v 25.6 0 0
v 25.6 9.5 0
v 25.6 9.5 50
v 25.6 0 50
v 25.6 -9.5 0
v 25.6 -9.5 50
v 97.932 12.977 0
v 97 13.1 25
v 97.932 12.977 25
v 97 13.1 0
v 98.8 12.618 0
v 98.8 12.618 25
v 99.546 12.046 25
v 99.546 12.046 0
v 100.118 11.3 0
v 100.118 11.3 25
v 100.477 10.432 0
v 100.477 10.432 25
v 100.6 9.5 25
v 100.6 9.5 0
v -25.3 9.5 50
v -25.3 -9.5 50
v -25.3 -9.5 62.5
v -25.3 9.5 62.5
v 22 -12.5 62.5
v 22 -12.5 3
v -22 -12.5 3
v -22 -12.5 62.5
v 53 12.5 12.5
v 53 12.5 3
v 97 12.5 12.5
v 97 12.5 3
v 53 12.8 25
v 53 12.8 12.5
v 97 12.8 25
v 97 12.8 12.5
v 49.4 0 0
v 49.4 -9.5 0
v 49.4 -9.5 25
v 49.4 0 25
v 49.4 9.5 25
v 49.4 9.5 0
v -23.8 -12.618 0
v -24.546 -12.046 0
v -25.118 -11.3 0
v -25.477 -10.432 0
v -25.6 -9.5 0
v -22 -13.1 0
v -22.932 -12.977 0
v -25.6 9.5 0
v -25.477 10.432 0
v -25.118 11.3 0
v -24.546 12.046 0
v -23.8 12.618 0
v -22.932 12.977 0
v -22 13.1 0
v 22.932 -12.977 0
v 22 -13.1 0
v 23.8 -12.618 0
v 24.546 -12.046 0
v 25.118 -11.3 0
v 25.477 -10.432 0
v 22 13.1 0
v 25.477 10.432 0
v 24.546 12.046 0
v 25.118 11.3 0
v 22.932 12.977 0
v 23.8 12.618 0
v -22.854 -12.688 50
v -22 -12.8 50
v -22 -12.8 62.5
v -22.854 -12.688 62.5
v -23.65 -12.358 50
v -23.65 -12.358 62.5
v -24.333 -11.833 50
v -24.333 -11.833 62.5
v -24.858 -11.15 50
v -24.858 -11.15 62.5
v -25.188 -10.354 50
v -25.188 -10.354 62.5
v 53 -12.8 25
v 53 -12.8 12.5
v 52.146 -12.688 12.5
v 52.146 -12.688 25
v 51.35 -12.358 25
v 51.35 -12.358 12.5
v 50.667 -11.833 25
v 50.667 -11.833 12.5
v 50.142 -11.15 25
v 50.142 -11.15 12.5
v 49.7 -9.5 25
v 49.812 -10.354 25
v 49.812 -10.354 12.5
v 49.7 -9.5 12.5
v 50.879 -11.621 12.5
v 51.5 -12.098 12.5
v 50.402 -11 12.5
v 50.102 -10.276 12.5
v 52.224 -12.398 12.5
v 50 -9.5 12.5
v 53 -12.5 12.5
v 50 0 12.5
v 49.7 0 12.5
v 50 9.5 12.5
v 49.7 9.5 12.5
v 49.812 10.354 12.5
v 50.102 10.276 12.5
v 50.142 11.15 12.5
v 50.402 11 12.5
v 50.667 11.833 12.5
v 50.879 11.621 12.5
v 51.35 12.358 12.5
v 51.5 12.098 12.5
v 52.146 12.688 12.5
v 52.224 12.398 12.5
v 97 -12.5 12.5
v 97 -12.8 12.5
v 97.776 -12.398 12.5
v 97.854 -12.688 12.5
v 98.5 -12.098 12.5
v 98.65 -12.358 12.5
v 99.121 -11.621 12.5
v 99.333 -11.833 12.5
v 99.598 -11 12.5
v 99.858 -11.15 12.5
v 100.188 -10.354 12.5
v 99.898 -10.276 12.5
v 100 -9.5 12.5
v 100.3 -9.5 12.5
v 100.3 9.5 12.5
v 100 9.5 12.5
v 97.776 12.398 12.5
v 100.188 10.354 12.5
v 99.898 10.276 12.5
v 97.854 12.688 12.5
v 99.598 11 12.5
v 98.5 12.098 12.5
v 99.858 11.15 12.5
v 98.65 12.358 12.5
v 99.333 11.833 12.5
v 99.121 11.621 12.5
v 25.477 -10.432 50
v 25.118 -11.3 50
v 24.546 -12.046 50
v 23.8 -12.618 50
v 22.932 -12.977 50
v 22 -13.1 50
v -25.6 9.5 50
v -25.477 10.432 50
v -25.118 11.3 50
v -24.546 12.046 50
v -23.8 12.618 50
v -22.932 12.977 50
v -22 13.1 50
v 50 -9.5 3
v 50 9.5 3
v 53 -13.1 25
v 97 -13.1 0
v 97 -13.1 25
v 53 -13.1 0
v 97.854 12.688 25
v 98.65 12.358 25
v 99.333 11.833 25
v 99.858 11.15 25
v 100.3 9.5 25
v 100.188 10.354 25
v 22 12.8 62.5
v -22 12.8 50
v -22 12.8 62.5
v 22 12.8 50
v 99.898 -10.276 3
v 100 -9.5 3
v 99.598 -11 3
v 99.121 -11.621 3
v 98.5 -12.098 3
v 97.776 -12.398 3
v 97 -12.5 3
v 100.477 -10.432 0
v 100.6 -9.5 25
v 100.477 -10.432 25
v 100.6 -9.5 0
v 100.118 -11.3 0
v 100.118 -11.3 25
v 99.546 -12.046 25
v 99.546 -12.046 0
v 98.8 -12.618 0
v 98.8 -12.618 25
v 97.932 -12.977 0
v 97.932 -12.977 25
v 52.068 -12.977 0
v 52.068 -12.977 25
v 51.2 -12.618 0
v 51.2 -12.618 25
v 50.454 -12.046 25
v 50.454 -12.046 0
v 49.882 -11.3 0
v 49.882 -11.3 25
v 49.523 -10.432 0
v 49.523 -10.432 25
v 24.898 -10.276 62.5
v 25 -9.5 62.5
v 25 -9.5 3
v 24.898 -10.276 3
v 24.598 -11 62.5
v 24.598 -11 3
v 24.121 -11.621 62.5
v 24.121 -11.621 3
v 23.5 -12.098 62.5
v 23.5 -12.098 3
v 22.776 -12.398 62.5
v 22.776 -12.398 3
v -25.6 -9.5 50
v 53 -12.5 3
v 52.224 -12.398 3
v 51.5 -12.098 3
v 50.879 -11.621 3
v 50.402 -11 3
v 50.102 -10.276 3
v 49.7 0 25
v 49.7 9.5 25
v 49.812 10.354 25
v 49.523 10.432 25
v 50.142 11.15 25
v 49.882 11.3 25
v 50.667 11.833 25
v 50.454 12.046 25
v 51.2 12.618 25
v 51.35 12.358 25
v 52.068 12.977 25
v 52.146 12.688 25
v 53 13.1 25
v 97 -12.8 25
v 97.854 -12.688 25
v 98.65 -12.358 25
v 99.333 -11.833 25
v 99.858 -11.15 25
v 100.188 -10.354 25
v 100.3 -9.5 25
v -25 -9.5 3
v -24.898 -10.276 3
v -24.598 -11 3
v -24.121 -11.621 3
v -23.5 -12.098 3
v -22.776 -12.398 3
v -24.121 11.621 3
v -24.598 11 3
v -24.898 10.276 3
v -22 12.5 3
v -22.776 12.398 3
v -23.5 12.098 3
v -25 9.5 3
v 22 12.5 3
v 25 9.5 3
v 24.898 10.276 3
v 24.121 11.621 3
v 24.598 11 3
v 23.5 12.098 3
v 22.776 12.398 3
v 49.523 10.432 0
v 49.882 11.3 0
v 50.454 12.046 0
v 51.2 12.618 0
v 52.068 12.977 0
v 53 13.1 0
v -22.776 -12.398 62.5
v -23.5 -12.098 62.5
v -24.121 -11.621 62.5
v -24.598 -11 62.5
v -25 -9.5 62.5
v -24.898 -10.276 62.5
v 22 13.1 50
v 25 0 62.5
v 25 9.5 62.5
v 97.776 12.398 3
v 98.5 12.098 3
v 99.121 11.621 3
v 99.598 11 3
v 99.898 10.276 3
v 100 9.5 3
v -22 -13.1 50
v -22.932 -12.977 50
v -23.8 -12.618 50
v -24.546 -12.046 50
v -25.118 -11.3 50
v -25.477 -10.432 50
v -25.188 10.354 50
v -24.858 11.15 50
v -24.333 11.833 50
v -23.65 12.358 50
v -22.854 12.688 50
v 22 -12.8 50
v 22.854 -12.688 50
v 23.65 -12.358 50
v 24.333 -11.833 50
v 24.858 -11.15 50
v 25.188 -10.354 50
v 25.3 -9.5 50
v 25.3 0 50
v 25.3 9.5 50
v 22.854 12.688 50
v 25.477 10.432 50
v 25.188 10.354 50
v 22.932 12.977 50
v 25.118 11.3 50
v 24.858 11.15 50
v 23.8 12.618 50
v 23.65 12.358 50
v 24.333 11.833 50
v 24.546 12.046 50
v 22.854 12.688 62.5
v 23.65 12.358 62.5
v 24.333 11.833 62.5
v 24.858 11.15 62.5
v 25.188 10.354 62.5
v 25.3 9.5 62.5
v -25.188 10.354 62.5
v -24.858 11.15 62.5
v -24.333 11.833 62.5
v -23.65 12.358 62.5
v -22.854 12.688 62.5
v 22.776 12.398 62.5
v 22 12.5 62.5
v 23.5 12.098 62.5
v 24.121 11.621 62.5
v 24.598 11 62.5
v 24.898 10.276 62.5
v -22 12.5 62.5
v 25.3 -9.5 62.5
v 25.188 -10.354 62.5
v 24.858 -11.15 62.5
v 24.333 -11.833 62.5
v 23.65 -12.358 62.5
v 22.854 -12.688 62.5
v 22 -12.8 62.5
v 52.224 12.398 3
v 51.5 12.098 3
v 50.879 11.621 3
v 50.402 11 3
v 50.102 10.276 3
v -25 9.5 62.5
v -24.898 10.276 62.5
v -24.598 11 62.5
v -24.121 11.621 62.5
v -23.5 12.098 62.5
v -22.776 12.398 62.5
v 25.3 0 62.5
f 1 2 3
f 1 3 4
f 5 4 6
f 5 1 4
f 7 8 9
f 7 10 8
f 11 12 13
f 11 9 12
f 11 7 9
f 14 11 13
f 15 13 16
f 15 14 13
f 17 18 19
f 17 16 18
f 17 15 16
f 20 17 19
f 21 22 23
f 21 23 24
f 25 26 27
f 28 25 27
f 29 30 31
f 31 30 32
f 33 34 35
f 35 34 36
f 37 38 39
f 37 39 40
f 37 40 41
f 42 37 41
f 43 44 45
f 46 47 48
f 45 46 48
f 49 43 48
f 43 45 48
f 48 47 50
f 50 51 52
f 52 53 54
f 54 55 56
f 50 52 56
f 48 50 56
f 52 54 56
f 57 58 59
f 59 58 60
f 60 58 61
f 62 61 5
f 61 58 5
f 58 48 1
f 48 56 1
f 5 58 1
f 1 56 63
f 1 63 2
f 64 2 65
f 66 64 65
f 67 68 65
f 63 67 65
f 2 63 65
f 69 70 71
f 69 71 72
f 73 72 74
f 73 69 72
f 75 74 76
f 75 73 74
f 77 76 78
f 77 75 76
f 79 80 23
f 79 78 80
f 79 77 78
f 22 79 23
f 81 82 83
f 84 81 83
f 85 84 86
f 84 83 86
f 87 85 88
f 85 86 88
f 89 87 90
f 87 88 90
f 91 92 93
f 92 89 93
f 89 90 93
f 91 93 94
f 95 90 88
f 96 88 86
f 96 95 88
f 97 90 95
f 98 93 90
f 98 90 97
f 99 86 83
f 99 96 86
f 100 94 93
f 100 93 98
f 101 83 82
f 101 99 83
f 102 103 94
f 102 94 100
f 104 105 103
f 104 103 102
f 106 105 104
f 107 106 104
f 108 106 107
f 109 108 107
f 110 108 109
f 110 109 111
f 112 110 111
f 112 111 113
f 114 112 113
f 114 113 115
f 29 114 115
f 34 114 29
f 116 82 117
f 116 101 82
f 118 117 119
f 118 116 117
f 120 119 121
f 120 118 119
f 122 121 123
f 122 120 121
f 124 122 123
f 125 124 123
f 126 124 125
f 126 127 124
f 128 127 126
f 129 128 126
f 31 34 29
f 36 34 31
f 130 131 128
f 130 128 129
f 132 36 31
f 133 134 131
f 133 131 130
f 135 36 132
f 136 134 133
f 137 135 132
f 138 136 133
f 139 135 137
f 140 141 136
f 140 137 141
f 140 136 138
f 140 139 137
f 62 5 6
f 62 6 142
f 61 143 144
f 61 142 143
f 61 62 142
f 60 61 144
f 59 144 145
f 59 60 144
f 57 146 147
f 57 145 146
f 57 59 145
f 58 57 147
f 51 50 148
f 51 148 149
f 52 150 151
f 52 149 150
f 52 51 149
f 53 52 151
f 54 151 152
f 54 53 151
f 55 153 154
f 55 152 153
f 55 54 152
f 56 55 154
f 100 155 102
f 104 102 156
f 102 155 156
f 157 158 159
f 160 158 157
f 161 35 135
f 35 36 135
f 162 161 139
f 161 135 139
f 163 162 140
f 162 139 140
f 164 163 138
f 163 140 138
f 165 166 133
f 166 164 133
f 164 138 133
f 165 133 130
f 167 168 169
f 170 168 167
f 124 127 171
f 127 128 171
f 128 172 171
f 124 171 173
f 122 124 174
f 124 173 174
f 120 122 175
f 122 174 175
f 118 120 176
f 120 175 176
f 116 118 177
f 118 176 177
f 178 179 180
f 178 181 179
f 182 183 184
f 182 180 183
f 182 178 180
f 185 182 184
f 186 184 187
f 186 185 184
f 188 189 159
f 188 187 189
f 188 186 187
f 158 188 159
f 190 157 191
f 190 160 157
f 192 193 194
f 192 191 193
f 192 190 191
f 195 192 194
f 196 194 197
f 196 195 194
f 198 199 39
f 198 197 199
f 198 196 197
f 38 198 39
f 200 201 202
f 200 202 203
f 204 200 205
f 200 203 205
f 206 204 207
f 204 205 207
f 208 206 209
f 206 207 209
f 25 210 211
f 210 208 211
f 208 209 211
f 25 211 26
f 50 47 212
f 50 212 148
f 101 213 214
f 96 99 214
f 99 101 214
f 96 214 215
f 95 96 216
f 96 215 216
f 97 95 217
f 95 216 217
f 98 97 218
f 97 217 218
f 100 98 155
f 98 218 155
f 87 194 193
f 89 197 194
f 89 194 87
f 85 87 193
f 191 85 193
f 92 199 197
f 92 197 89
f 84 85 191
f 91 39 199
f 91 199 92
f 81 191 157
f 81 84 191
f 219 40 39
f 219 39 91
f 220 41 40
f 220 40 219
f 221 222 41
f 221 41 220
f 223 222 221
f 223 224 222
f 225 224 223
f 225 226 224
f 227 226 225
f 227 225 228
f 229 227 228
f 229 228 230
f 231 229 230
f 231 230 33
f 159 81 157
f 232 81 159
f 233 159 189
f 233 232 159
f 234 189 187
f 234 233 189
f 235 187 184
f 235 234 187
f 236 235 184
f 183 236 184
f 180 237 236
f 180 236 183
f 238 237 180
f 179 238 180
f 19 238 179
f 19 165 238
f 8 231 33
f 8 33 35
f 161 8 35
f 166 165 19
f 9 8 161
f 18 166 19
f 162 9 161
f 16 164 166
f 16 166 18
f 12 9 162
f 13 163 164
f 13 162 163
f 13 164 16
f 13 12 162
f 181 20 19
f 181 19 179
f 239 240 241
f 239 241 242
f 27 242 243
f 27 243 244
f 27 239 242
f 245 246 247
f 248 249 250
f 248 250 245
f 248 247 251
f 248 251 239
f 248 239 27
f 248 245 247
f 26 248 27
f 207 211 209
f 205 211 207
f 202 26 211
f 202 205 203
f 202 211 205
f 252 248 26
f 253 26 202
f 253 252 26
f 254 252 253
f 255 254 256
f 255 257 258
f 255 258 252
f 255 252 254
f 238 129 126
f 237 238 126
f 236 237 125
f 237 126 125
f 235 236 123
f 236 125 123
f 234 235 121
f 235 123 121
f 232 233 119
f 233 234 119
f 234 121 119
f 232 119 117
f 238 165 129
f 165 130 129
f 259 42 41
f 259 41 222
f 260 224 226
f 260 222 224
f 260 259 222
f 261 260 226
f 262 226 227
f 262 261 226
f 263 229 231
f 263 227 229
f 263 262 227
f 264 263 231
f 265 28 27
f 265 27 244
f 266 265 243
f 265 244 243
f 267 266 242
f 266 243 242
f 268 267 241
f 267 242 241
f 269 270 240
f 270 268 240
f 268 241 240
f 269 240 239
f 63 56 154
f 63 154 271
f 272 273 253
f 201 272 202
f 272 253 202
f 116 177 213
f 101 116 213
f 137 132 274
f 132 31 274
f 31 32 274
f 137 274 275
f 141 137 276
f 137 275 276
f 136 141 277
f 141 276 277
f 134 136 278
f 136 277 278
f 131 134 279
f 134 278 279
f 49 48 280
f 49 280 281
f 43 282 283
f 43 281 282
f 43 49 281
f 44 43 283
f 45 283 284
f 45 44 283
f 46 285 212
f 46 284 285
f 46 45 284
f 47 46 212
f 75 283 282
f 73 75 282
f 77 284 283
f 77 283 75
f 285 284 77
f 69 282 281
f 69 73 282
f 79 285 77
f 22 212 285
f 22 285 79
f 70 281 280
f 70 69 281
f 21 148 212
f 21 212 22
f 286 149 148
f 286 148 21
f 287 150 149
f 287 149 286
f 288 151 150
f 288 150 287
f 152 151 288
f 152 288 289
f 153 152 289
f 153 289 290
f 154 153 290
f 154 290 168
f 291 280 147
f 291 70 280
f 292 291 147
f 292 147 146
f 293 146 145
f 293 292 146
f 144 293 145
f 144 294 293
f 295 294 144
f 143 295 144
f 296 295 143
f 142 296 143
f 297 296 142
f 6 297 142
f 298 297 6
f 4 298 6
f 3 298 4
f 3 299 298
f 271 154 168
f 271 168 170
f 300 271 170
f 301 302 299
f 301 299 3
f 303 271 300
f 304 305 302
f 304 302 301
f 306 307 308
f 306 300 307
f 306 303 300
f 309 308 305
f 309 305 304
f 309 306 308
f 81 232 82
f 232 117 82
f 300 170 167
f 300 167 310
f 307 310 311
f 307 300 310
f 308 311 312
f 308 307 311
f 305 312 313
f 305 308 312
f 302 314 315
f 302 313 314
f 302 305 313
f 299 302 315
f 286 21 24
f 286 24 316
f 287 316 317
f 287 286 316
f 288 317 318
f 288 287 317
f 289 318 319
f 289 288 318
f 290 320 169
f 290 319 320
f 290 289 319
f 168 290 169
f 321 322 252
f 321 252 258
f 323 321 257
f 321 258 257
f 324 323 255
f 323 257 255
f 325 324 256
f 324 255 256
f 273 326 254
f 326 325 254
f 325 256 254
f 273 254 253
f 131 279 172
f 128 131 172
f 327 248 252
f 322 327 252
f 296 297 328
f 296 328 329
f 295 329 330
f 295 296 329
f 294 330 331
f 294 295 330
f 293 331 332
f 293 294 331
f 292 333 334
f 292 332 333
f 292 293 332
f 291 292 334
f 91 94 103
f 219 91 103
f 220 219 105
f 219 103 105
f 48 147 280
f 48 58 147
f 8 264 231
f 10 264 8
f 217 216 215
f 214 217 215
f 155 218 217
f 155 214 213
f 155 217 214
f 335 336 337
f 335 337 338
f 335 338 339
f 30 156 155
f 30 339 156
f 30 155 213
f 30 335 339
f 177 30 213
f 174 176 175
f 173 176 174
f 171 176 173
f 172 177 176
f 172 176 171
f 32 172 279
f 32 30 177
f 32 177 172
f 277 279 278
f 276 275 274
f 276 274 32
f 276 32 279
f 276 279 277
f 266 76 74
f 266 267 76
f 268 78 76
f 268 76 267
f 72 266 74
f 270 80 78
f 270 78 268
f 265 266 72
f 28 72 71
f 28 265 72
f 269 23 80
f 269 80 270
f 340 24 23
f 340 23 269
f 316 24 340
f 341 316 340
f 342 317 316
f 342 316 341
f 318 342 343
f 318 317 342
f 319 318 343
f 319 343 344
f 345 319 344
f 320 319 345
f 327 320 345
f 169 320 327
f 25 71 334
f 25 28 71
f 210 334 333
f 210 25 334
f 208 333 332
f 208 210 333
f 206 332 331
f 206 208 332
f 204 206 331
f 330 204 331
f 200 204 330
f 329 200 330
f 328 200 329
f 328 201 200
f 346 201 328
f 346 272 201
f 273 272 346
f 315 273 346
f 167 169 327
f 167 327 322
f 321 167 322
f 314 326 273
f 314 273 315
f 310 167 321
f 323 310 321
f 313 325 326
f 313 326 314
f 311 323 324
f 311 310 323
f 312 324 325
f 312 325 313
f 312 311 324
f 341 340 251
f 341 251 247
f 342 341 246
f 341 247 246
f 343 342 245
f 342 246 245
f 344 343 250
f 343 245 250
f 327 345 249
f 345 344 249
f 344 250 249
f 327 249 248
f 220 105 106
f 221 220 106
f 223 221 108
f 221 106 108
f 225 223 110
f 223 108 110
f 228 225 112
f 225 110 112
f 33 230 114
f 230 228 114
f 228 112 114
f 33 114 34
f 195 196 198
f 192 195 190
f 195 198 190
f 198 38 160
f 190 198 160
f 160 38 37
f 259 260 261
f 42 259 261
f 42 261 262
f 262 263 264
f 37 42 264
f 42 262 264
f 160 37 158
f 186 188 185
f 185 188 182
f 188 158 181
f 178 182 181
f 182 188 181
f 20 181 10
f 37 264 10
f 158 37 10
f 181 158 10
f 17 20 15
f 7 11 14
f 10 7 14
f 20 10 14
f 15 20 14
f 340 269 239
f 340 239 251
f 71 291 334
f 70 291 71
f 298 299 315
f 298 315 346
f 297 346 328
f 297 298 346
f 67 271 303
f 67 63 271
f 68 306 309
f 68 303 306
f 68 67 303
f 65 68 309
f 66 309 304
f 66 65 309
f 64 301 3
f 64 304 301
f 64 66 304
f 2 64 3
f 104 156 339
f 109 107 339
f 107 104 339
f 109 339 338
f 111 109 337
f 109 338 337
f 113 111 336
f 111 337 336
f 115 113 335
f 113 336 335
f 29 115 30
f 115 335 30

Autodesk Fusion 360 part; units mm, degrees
sketch "Sketch1" plane through (0, 0, 0) normal (0, 0, 1) x (1, 0, 0)
  line L0 (22, -12.5) -> (-22, -12.5)
  line L1 (-25, -9.5) -> (-25, 9.5)
  line L2 (-22, 12.5) -> (22, 12.5)
  line L3 (25, 9.5) -> (25, -9.5)
  line L4 (25, -12.5) -> (-25, 12.5) construction
  line L5 (-25, -12.5) -> (25, 12.5) construction
  line L6 (0, 0) -> (75, 0)
  line L7 (97, -12.5) -> (53, -12.5)
  line L8 (50, -9.5) -> (50, 9.5)
  line L9 (53, 12.5) -> (97, 12.5)
  line L10 (100, 9.5) -> (100, -9.5)
  line L11 (100, -12.5) -> (50, 12.5) construction
  line L12 (50, -12.5) -> (100, 12.5) construction
  arc A0 (53, 12.5) -> (50, 9.5) centre (53, 9.5) ccw
  arc A1 (100, 9.5) -> (97, 12.5) centre (97, 9.5) ccw
  arc A2 (50, -9.5) -> (53, -12.5) centre (53, -9.5) ccw
  arc A3 (97, -12.5) -> (100, -9.5) centre (97, -9.5) ccw
  arc A4 (50, -9.5) -> (53, -12.5) centre (53, -9.5) ccw
  arc A5 (-22, 12.5) -> (-25, 9.5) centre (-22, 9.5) ccw
  arc A6 (-25, -9.5) -> (-22, -12.5) centre (-22, -9.5) ccw
  arc A7 (25, 9.5) -> (22, 12.5) centre (22, 9.5) ccw
  arc A8 (22, -12.5) -> (25, -9.5) centre (22, -9.5) ccw
  arc A9 (25, 9.5) -> (22, 12.5) centre (22, 9.5) ccw
  arc A10 (-25, -9.5) -> (-22, -12.5) centre (-22, -9.5) ccw
  arc A11 (22, -12.5) -> (25, -9.5) centre (22, -9.5) ccw
  arc A12 (25.3, 9.5) -> (22, 12.8) centre (22, 9.5) ccw
  line L13 (-22, 12.8) -> (22, 12.8)
  arc A13 (-22, 12.8) -> (-25.3, 9.5) centre (-22, 9.5) ccw
  line L14 (-25.3, -9.5) -> (-25.3, 9.5)
  arc A14 (-25.3, -9.5) -> (-22, -12.8) centre (-22, -9.5) ccw
  line L15 (22, -12.8) -> (-22, -12.8)
  arc A15 (22, -12.8) -> (25.3, -9.5) centre (22, -9.5) ccw
  line L16 (25.3, 9.5) -> (25.3, -9.5)
  arc A16 (25.6, 9.5) -> (22, 13.1) centre (22, 9.5) ccw
  line L17 (-22, 13.1) -> (22, 13.1)
  arc A17 (-22, 13.1) -> (-25.6, 9.5) centre (-22, 9.5) ccw
  line L18 (-25.6, -9.5) -> (-25.6, 9.5)
  arc A18 (-25.6, -9.5) -> (-22, -13.1) centre (-22, -9.5) ccw
  line L19 (22, -13.1) -> (-22, -13.1)
  arc A19 (22, -13.1) -> (25.6, -9.5) centre (22, -9.5) ccw
  line L20 (25.6, 9.5) -> (25.6, -9.5)
  arc A20 (100.3, 9.5) -> (97, 12.8) centre (97, 9.5) ccw
  line L21 (53, 12.8) -> (97, 12.8)
  arc A21 (53, 12.8) -> (49.7, 9.5) centre (53, 9.5) ccw
  line L22 (49.7, -9.5) -> (49.7, 9.5)
  arc A22 (49.7, -9.5) -> (53, -12.8) centre (53, -9.5) ccw
  line L23 (97, -12.8) -> (53, -12.8)
  arc A23 (97, -12.8) -> (100.3, -9.5) centre (97, -9.5) ccw
  line L24 (100.3, 9.5) -> (100.3, -9.5)
  arc A24 (100.6, 9.5) -> (97, 13.1) centre (97, 9.5) ccw
  line L25 (53, 13.1) -> (97, 13.1)
  arc A25 (53, 13.1) -> (49.4, 9.5) centre (53, 9.5) ccw
  line L26 (49.4, -9.5) -> (49.4, 9.5)
  arc A26 (49.4, -9.5) -> (53, -13.1) centre (53, -9.5) ccw
  line L27 (97, -13.1) -> (53, -13.1)
  arc A27 (97, -13.1) -> (100.6, -9.5) centre (97, -9.5) ccw
  line L28 (100.6, 9.5) -> (100.6, -9.5)
  point P0 (75, 0)
  dimension "d9" = 50
  dimension "d10" = 25
  dimension "d12" = 75
  dimension "d13" = 50
  dimension "d14" = 25
  dimension "d16" = 3
  dimension "d17" = 3
  dimension "d18" = 3
  dimension "d19" = 3
  dimension "d20" = 3
  dimension "d21" = 3
  dimension "d22" = 3
  dimension "d23" = 3
extrude "Extrude1" add sketch "Sketch1" along normal blind 3 contours L7 L8 L9 L10 A0 A1 A2 A3 A4 makes body 1
extrude "Extrude2" add sketch "Sketch1" along normal up to surface (3 mm away) separate body contours L0 L1 L2 L3 A5 A6 A7 A8 A9 A10 A11 makes body 2
extrude "Extrude3" add sketch "Sketch1" along normal blind 50 separate body contours A16 L17 A17 L18 A18 L19 A19 L20 makes body 3
extrude "Extrude4" add sketch "Sketch1" along normal blind 62.5 contours A12 L13 A13 L14 A14 L15 A15 L16 bodies 2 3
extrude "Extrude5" add sketch "Sketch1" along normal blind 25 separate body contours A24 L25 A25 L26 A26 L27 A27 L28 makes body 4
extrude "Extrude6" add sketch "Sketch1" along normal blind 12.5 contours A20 L21 A21 L22 A22 L23 A23 L24 bodies 1 4
equation "RECLONG = 50 mm"
equation "recShort = RECLONG / 2"
equation "FILLET = 3 mm"
equation "RECLENGTH = 50 mm"
equation "cupLength = RECLENGTH + RECLENGTH / 4"
equation "tipLength = RECLENGTH / 2"
equation "tipInlength = cupLength - RECLENGTH"
equation "d9 = RECLONG"
equation "d10 = recShort"
equation "distance = RECLONG * 1.5"
equation "d12 = distance"
equation "d13 = RECLONG"
equation "d14 = recShort"
equation "snugslipoffset = 0.3 mm"
equation "d16 = FILLET"
equation "d17 = FILLET"
equation "d18 = FILLET"
equation "d19 = FILLET"
equation "d20 = FILLET"
equation "d21 = FILLET"
equation "d22 = FILLET"
equation "d23 = FILLET"
equation "d24 = -snugslipoffset"
equation "d25 = -snugslipoffset"
equation "d26 = -snugslipoffset"
equation "d27 = -snugslipoffset"
equation "d32 = RECLENGTH"
equation "d34 = cupLength"
equation "d36 = tipLength"
equation "d38 = tipInlength"
